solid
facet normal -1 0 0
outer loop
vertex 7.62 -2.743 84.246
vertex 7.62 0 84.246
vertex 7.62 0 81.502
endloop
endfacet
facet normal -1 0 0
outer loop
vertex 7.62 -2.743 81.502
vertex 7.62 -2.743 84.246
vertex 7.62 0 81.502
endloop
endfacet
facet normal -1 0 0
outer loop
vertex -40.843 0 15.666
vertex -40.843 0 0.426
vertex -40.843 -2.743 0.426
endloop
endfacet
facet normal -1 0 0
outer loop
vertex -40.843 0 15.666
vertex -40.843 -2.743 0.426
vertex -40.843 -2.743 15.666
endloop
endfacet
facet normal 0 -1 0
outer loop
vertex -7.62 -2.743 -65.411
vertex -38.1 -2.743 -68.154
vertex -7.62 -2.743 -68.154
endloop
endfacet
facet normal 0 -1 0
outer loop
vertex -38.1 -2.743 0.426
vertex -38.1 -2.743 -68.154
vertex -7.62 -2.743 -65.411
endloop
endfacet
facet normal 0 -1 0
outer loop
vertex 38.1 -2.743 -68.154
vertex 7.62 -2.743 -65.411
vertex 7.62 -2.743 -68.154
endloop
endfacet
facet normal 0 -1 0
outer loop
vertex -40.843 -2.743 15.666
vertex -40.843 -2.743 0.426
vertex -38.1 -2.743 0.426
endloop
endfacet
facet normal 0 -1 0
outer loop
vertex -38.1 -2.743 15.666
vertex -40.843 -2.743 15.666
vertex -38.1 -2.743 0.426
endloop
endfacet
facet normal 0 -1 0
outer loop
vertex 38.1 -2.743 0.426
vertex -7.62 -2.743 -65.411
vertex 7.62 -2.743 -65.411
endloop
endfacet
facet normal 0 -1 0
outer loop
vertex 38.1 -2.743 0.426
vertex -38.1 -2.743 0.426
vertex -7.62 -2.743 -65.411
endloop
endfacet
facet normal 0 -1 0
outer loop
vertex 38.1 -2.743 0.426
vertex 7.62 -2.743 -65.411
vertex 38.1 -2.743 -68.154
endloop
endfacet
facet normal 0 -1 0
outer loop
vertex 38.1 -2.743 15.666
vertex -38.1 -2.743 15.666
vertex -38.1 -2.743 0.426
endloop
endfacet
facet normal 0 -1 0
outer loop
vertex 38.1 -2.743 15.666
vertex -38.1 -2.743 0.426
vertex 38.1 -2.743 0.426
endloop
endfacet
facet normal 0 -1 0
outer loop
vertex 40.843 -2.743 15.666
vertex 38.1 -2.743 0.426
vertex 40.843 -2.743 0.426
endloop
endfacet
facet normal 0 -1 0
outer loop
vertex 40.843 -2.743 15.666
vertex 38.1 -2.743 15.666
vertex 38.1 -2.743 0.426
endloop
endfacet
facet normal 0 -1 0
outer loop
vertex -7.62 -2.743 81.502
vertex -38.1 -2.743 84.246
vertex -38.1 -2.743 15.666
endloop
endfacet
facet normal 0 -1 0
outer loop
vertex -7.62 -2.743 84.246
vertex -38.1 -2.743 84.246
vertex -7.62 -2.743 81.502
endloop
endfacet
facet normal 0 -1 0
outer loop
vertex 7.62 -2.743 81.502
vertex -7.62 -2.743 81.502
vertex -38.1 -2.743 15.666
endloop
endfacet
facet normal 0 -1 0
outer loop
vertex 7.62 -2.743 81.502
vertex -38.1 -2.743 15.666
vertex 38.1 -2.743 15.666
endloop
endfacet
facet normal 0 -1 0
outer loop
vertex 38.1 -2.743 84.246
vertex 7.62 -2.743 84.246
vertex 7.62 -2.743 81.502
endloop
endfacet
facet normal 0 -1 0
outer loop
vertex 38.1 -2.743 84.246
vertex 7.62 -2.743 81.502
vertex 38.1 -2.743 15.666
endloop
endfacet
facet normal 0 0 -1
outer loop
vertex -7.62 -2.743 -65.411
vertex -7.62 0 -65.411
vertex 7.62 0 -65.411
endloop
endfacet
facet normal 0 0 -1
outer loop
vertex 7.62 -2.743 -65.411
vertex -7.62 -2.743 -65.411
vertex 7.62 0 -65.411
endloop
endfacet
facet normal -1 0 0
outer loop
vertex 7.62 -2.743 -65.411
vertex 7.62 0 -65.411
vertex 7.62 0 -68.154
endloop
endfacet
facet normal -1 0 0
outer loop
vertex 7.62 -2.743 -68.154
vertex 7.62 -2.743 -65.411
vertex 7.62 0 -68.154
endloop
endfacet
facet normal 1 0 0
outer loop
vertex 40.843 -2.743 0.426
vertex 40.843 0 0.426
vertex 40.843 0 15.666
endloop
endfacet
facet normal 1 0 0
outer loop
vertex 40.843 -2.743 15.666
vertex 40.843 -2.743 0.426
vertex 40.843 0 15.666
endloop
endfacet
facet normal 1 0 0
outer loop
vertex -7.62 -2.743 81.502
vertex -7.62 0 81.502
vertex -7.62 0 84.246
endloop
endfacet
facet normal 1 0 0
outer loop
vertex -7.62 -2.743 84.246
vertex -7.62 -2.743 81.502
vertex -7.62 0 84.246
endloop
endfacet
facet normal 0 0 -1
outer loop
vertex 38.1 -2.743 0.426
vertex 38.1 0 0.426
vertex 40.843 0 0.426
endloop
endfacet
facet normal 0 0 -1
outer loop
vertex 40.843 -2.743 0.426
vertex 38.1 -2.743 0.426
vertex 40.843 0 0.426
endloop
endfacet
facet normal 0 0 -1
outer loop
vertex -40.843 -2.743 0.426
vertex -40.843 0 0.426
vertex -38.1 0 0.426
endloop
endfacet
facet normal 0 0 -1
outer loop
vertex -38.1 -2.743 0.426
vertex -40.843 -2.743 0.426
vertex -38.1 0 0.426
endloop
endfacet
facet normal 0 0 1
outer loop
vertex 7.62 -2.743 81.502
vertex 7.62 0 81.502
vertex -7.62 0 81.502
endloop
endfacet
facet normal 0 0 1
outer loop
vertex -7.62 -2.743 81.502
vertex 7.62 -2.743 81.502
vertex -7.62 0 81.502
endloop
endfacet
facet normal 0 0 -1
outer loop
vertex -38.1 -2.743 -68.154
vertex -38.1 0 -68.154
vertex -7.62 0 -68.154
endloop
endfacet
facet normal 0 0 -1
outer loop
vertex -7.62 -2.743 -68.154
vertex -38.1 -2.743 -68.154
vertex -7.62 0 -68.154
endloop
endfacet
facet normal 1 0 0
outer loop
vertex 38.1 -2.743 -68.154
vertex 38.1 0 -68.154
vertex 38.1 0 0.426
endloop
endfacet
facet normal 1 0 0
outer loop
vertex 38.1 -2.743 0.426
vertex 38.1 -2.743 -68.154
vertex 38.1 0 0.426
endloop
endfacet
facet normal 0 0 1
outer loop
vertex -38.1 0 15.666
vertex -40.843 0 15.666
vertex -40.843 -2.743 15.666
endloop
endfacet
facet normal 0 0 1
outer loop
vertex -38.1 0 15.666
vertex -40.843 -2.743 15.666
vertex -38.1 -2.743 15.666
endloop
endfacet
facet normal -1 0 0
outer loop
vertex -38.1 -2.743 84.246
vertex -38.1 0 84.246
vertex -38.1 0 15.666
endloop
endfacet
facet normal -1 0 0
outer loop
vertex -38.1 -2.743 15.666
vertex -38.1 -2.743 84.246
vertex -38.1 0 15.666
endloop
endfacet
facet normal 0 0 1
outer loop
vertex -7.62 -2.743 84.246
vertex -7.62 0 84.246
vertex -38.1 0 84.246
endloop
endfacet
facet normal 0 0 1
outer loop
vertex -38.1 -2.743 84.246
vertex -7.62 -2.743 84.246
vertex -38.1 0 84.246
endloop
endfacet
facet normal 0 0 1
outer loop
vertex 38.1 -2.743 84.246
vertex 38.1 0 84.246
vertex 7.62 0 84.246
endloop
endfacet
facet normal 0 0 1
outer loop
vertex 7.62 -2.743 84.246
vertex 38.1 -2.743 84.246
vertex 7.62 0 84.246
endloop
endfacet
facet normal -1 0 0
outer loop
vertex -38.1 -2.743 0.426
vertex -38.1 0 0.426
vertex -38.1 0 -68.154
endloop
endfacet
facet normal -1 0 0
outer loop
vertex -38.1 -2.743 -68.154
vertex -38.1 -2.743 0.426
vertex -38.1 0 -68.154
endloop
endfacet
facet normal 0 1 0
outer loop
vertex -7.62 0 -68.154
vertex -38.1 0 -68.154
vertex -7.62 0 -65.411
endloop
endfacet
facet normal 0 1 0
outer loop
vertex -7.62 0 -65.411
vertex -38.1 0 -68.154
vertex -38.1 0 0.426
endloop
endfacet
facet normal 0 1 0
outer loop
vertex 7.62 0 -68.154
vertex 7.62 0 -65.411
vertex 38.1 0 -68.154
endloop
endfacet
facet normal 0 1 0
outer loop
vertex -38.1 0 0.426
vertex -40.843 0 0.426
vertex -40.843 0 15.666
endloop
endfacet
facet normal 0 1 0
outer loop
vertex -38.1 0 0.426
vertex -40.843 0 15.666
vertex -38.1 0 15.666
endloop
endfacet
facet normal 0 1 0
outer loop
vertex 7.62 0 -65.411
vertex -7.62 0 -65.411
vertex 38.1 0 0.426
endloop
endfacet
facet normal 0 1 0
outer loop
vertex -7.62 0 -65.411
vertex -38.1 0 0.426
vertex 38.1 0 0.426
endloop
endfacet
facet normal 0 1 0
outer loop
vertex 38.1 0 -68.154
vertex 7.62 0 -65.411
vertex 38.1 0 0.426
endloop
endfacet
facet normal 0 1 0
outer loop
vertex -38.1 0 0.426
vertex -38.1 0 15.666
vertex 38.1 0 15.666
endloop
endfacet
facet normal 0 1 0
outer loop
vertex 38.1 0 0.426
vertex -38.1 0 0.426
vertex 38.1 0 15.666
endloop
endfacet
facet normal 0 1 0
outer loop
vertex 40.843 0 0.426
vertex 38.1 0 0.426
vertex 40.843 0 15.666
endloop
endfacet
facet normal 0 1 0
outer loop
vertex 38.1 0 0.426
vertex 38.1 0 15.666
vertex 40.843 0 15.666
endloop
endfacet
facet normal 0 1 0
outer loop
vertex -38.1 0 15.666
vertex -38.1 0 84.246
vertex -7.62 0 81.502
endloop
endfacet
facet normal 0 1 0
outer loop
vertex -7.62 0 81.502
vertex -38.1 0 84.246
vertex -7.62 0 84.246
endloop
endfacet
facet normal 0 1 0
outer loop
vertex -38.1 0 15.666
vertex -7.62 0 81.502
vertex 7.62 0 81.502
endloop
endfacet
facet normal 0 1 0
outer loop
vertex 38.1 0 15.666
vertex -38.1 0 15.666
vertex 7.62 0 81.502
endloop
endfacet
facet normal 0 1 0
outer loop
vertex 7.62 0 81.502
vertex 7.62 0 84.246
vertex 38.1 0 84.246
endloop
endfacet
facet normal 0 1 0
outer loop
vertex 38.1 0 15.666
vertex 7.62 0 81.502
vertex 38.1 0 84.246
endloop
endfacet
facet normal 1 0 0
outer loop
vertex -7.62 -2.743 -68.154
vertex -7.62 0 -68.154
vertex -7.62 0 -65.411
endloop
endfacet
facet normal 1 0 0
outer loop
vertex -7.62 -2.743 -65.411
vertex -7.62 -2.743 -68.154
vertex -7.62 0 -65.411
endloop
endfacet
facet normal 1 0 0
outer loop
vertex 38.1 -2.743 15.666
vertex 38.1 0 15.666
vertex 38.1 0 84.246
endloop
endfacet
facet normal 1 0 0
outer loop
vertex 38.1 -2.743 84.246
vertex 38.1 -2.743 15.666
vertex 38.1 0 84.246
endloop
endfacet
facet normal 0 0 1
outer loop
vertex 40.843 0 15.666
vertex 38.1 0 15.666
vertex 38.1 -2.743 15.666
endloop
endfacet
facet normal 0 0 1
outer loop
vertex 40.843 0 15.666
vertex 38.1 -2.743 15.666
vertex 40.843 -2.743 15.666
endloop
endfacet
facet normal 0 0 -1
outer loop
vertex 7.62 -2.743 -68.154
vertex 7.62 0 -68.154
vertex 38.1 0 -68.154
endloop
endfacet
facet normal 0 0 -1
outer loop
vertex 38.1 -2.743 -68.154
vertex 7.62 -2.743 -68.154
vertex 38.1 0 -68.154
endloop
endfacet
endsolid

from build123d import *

# Parameters (mm, degrees)
F0_W     = 2.7432
F0_H     = 15.24
F1_DEPTH = 2.7432


with BuildPart() as f1:
    # F0 (on Front) → F1 (new body)
    with BuildSketch(Plane.XZ):
        Polygon((-7.62, 84.245604), (-38.1, 84.245604), (-38.1, 15.665604), (-38.1, 0.425604), (-38.1, -68.154396), (-7.62, -68.154396), (-7.62, -65.411196), (7.62, -65.411196), (7.62, -68.154396), (38.1, -68.154396), (38.1, 0.425604), (38.1, 15.665604), (38.1, 84.245604), (7.62, 84.245604), (7.62, 81.502404), (-7.62, 81.502404), align=None)
        with Locations((-39.4716, 8.045604)):
            Rectangle(F0_W, F0_H)
        with Locations((39.4716, 8.045604)):
            Rectangle(F0_W, F0_H)
    extrude(amount=F1_DEPTH)


solid = f1.part
